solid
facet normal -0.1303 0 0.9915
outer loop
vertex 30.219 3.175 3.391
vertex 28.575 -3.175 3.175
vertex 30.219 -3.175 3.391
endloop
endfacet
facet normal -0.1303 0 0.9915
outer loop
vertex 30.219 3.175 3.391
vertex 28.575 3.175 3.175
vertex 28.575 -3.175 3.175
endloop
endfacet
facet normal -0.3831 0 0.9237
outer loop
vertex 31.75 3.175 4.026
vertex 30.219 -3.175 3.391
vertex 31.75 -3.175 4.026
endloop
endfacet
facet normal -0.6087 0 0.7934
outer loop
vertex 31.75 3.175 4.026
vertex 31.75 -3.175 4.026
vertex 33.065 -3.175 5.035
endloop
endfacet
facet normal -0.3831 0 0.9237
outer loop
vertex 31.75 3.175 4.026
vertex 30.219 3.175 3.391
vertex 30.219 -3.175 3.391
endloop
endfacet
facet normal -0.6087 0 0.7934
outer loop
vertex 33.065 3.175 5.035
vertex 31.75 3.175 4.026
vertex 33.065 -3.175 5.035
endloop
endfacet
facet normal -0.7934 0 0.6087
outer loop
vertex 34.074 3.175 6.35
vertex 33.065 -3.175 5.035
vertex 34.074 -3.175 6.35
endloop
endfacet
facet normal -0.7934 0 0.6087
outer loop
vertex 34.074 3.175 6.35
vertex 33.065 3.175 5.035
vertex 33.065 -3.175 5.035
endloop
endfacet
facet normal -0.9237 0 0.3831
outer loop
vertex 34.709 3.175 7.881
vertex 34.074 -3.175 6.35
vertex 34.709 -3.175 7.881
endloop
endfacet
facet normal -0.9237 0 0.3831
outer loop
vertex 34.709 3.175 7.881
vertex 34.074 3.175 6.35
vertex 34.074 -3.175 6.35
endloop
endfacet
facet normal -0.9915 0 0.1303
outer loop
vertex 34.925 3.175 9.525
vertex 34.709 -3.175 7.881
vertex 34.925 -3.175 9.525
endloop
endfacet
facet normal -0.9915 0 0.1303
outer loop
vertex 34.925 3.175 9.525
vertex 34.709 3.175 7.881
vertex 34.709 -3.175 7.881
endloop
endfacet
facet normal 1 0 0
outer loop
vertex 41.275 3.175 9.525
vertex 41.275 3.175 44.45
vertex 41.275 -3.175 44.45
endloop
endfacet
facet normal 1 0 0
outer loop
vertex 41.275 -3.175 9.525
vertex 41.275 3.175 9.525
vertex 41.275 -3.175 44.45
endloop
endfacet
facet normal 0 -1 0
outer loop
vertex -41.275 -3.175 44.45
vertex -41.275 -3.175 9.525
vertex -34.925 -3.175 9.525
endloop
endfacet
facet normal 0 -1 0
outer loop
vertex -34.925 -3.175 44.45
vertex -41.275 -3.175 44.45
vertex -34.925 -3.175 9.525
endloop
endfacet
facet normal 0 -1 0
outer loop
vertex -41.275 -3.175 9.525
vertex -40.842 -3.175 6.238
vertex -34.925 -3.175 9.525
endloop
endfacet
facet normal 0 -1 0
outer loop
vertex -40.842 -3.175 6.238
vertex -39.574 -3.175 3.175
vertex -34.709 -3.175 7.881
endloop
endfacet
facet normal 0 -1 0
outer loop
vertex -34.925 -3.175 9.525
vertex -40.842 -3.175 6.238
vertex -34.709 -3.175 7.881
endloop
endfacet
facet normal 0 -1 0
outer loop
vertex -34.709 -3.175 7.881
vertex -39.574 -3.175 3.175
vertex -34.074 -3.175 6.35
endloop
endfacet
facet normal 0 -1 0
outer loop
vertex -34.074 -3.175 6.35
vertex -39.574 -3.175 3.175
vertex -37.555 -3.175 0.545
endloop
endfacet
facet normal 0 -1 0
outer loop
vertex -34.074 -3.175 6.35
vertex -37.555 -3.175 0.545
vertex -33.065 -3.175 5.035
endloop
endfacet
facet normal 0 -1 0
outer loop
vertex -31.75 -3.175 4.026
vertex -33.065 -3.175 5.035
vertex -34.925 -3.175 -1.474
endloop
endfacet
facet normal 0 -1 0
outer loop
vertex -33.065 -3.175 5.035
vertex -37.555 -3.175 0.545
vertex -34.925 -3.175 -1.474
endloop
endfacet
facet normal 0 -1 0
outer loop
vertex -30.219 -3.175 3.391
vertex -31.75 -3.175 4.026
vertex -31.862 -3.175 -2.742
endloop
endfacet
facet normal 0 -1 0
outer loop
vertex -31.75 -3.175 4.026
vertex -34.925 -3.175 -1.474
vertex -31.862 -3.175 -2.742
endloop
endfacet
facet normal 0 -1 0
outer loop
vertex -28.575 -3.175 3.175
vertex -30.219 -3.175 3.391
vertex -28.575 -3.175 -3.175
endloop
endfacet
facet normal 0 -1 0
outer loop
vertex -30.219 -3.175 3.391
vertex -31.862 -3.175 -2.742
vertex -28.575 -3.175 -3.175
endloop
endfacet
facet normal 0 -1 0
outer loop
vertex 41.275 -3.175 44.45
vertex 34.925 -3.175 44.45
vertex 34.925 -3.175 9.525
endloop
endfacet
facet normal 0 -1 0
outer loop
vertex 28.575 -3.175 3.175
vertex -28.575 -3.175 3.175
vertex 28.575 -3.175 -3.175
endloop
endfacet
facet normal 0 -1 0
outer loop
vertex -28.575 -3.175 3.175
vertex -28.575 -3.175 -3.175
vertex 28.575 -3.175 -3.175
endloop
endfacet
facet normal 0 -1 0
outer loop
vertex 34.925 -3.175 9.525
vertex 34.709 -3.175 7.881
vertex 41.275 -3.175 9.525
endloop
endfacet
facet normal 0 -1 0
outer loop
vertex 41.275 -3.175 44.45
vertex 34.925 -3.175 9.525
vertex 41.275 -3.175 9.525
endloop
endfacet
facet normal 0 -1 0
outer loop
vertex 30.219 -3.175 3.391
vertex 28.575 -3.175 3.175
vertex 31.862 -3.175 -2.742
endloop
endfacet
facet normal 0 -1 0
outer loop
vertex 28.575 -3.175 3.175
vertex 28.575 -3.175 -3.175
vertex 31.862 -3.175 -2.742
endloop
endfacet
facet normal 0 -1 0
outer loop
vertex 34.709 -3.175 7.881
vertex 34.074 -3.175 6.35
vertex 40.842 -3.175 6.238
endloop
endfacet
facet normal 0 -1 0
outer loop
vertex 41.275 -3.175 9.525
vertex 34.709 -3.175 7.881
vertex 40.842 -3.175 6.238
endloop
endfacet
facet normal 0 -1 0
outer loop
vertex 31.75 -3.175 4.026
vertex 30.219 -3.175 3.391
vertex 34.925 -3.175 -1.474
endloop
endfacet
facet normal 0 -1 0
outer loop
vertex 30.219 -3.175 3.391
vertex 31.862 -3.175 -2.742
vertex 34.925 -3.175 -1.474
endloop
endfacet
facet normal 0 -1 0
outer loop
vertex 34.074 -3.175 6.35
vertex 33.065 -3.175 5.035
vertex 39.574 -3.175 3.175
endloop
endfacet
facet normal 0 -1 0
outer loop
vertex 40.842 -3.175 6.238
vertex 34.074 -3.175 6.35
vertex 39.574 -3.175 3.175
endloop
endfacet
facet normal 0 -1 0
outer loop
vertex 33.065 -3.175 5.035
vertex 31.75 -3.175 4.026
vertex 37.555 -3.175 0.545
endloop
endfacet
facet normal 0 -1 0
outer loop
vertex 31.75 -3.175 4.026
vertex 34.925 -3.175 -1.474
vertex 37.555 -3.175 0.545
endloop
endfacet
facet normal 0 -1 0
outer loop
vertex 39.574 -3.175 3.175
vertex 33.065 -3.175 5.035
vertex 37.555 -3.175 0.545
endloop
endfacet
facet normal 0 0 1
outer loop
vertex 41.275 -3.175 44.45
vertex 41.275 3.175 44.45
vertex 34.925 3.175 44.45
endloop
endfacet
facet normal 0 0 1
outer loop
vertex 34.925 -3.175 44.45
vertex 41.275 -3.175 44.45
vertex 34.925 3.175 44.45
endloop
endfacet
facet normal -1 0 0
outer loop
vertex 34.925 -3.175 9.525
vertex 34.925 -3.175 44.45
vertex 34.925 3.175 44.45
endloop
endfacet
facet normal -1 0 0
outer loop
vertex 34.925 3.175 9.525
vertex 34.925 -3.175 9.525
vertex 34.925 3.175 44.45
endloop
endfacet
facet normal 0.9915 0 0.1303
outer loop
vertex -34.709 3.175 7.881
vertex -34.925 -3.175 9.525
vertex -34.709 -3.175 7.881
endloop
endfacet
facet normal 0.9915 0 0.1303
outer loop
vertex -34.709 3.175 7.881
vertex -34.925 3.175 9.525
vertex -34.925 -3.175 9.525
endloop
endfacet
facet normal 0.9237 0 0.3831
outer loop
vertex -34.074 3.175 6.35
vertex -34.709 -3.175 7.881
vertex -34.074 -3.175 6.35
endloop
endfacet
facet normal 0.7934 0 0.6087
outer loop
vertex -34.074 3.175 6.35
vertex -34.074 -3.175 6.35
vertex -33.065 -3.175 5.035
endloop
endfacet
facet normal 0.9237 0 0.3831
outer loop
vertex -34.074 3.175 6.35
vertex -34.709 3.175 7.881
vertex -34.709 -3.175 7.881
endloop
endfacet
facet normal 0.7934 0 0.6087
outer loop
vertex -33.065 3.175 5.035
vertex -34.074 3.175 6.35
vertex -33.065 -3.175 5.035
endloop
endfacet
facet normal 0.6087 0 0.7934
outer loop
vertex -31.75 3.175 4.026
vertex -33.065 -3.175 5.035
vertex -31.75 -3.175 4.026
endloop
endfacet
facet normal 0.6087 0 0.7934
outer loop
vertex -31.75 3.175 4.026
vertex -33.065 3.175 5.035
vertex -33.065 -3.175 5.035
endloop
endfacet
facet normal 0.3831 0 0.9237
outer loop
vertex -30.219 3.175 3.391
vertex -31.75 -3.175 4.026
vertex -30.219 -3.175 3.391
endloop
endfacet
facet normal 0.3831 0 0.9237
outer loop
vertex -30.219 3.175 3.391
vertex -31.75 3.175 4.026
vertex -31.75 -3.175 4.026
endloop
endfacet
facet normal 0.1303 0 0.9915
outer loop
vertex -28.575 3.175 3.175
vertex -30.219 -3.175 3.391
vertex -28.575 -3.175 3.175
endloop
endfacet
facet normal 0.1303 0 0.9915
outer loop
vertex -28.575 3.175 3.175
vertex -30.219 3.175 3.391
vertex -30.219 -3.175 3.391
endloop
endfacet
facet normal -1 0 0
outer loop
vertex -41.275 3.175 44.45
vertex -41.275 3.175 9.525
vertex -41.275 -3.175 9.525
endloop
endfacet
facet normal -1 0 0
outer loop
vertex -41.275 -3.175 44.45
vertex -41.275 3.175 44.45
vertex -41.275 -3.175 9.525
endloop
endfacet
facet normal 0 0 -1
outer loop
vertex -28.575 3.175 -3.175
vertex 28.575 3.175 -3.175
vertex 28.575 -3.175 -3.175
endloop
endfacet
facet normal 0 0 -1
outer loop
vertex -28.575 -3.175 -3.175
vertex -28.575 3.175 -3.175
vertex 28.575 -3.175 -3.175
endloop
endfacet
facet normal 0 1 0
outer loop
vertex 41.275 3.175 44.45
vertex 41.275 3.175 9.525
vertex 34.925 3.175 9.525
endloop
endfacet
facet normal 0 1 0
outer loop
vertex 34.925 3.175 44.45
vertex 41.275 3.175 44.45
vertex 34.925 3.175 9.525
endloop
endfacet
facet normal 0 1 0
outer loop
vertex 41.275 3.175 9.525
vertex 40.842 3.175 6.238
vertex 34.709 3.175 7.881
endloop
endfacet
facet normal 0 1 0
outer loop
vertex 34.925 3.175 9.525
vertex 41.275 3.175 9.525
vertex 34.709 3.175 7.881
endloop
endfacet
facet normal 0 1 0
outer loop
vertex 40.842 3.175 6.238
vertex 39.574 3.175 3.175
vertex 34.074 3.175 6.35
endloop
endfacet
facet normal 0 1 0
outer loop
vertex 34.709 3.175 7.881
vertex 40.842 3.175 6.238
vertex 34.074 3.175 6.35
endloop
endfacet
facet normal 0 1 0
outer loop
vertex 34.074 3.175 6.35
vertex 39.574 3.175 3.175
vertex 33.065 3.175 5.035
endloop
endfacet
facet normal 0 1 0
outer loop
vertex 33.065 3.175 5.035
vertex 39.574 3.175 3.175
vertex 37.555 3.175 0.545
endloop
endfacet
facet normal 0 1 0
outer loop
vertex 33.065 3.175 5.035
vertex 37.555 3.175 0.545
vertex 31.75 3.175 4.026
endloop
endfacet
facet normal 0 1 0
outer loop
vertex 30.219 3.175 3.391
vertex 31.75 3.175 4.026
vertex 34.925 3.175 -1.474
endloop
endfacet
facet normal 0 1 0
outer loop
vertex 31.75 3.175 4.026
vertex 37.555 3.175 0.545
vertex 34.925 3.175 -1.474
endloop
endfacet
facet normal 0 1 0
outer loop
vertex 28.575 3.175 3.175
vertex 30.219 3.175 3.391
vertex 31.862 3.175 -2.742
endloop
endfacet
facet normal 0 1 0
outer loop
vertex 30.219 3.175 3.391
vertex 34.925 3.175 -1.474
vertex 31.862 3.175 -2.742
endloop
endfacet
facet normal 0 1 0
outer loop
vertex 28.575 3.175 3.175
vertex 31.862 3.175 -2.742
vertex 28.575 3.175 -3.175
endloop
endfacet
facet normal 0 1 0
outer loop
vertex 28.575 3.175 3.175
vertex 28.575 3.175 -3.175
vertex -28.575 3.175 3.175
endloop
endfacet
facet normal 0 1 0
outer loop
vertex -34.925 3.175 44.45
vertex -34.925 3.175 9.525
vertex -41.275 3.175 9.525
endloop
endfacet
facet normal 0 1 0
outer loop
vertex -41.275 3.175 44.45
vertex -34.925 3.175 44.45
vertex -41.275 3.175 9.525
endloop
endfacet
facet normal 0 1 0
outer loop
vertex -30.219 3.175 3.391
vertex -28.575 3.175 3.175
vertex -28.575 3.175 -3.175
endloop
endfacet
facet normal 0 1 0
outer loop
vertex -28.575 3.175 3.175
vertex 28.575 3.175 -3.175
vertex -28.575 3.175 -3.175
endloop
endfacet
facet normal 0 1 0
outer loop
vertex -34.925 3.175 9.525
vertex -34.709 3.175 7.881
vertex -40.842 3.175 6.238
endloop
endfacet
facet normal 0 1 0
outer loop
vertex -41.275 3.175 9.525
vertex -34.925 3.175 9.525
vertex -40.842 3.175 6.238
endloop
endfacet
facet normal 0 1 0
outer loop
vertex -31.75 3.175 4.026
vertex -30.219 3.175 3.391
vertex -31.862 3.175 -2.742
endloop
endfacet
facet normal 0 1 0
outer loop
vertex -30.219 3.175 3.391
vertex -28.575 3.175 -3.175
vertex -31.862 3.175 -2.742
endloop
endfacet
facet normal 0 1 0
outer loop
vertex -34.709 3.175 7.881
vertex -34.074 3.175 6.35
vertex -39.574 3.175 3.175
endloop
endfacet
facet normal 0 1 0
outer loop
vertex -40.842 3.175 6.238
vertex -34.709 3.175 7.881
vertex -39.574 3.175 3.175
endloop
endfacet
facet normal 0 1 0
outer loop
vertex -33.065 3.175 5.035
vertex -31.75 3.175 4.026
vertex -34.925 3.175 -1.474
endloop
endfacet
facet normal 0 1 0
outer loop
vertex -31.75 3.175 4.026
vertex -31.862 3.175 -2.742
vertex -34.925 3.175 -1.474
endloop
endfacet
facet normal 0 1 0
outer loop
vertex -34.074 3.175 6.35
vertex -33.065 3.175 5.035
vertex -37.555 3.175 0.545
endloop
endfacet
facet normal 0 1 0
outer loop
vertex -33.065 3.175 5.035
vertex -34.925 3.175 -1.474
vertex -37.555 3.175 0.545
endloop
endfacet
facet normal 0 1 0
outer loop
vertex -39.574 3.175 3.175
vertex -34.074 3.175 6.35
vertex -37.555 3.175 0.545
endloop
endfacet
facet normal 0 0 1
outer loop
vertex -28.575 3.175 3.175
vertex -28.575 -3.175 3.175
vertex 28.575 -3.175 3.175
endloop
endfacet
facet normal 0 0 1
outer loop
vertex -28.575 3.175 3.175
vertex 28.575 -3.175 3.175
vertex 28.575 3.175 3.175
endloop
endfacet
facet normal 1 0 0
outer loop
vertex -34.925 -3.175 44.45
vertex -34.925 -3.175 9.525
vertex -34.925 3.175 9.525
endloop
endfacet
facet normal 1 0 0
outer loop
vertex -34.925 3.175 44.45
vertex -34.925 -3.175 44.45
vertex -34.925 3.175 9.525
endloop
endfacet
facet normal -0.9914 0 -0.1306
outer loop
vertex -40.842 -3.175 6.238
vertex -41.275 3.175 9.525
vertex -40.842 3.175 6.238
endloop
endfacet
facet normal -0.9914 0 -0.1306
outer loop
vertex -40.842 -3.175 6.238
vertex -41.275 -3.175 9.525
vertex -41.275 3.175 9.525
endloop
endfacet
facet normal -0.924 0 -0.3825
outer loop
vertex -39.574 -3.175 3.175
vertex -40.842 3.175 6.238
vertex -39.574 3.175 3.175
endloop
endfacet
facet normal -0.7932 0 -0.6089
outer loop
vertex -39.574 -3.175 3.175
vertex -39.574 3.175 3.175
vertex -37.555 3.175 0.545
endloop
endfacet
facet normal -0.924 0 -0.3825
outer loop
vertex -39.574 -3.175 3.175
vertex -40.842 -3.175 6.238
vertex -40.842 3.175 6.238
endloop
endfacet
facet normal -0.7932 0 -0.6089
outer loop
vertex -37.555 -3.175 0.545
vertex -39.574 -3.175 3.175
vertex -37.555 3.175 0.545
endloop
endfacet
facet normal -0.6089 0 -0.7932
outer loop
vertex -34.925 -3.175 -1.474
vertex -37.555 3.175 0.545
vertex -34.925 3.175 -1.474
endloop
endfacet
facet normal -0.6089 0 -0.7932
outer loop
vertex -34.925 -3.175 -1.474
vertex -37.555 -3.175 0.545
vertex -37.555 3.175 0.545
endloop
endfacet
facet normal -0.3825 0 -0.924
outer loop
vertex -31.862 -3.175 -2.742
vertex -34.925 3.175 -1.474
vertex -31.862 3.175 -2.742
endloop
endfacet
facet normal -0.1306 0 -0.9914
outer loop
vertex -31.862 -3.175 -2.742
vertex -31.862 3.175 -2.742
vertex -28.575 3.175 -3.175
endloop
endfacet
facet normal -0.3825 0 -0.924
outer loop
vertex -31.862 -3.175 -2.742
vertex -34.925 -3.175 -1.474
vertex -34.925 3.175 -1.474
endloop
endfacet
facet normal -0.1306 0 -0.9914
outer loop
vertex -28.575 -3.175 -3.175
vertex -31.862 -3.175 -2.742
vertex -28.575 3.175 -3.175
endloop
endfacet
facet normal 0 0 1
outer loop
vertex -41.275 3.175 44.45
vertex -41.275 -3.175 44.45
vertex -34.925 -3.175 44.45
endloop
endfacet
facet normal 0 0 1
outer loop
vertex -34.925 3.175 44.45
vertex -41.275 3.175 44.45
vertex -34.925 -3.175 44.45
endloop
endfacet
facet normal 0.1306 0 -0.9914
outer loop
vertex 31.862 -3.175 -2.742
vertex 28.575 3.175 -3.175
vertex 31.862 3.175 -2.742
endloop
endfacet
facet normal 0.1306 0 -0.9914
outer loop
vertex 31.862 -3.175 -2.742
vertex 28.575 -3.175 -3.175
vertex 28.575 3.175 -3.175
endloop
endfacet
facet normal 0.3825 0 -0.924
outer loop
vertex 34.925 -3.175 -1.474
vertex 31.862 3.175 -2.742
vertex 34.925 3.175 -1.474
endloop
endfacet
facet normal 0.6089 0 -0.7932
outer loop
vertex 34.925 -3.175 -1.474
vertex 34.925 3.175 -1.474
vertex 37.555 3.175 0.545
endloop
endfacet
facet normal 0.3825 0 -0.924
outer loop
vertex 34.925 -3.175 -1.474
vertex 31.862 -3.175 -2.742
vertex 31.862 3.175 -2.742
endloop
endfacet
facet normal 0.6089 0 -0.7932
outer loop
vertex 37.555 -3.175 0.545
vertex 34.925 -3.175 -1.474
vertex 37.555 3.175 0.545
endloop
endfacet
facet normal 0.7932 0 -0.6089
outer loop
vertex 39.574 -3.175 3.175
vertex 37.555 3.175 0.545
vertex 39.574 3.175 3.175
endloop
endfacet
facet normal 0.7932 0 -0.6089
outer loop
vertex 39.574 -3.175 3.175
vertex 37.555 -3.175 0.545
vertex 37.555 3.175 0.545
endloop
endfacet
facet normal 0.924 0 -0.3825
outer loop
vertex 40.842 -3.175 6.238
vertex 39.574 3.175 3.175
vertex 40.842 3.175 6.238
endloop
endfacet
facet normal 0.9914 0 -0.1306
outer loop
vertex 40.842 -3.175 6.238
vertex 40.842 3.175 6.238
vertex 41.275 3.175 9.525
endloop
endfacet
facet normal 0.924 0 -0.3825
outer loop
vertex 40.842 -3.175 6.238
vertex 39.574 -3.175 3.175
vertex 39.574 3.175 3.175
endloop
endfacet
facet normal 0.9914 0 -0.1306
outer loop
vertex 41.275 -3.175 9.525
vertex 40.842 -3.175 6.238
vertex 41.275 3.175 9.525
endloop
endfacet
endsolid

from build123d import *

# Parameters (mm, degrees)
F2_W = 6.35
F2_H = 6.35


with BuildPart() as f3:
    # F3: sweep along a path in F0
    with BuildLine(Plane.XZ) as f3_path:
        Line((-38.1, 44.45), (-38.1, 9.525))
        ThreePointArc((-38.1, 9.525), (-35.3101920908, 2.7898079092), (-28.575, 0))
        Line((-28.575, 0), (0, 0))
        Line((0, 0), (28.575, 0))
        ThreePointArc((28.575, 0), (35.3101920908, 2.7898079092), (38.1, 9.525))
        Line((38.1, 9.525), (38.1, 44.45))
    # F2 (on offset) → F3 (sweep)
    with BuildSketch(Plane.XY.offset(44.45)):
        with Locations((-38.1, 0)):
            Rectangle(F2_W, F2_H)
    sweep(path=f3_path.line)


solid = f3.part
